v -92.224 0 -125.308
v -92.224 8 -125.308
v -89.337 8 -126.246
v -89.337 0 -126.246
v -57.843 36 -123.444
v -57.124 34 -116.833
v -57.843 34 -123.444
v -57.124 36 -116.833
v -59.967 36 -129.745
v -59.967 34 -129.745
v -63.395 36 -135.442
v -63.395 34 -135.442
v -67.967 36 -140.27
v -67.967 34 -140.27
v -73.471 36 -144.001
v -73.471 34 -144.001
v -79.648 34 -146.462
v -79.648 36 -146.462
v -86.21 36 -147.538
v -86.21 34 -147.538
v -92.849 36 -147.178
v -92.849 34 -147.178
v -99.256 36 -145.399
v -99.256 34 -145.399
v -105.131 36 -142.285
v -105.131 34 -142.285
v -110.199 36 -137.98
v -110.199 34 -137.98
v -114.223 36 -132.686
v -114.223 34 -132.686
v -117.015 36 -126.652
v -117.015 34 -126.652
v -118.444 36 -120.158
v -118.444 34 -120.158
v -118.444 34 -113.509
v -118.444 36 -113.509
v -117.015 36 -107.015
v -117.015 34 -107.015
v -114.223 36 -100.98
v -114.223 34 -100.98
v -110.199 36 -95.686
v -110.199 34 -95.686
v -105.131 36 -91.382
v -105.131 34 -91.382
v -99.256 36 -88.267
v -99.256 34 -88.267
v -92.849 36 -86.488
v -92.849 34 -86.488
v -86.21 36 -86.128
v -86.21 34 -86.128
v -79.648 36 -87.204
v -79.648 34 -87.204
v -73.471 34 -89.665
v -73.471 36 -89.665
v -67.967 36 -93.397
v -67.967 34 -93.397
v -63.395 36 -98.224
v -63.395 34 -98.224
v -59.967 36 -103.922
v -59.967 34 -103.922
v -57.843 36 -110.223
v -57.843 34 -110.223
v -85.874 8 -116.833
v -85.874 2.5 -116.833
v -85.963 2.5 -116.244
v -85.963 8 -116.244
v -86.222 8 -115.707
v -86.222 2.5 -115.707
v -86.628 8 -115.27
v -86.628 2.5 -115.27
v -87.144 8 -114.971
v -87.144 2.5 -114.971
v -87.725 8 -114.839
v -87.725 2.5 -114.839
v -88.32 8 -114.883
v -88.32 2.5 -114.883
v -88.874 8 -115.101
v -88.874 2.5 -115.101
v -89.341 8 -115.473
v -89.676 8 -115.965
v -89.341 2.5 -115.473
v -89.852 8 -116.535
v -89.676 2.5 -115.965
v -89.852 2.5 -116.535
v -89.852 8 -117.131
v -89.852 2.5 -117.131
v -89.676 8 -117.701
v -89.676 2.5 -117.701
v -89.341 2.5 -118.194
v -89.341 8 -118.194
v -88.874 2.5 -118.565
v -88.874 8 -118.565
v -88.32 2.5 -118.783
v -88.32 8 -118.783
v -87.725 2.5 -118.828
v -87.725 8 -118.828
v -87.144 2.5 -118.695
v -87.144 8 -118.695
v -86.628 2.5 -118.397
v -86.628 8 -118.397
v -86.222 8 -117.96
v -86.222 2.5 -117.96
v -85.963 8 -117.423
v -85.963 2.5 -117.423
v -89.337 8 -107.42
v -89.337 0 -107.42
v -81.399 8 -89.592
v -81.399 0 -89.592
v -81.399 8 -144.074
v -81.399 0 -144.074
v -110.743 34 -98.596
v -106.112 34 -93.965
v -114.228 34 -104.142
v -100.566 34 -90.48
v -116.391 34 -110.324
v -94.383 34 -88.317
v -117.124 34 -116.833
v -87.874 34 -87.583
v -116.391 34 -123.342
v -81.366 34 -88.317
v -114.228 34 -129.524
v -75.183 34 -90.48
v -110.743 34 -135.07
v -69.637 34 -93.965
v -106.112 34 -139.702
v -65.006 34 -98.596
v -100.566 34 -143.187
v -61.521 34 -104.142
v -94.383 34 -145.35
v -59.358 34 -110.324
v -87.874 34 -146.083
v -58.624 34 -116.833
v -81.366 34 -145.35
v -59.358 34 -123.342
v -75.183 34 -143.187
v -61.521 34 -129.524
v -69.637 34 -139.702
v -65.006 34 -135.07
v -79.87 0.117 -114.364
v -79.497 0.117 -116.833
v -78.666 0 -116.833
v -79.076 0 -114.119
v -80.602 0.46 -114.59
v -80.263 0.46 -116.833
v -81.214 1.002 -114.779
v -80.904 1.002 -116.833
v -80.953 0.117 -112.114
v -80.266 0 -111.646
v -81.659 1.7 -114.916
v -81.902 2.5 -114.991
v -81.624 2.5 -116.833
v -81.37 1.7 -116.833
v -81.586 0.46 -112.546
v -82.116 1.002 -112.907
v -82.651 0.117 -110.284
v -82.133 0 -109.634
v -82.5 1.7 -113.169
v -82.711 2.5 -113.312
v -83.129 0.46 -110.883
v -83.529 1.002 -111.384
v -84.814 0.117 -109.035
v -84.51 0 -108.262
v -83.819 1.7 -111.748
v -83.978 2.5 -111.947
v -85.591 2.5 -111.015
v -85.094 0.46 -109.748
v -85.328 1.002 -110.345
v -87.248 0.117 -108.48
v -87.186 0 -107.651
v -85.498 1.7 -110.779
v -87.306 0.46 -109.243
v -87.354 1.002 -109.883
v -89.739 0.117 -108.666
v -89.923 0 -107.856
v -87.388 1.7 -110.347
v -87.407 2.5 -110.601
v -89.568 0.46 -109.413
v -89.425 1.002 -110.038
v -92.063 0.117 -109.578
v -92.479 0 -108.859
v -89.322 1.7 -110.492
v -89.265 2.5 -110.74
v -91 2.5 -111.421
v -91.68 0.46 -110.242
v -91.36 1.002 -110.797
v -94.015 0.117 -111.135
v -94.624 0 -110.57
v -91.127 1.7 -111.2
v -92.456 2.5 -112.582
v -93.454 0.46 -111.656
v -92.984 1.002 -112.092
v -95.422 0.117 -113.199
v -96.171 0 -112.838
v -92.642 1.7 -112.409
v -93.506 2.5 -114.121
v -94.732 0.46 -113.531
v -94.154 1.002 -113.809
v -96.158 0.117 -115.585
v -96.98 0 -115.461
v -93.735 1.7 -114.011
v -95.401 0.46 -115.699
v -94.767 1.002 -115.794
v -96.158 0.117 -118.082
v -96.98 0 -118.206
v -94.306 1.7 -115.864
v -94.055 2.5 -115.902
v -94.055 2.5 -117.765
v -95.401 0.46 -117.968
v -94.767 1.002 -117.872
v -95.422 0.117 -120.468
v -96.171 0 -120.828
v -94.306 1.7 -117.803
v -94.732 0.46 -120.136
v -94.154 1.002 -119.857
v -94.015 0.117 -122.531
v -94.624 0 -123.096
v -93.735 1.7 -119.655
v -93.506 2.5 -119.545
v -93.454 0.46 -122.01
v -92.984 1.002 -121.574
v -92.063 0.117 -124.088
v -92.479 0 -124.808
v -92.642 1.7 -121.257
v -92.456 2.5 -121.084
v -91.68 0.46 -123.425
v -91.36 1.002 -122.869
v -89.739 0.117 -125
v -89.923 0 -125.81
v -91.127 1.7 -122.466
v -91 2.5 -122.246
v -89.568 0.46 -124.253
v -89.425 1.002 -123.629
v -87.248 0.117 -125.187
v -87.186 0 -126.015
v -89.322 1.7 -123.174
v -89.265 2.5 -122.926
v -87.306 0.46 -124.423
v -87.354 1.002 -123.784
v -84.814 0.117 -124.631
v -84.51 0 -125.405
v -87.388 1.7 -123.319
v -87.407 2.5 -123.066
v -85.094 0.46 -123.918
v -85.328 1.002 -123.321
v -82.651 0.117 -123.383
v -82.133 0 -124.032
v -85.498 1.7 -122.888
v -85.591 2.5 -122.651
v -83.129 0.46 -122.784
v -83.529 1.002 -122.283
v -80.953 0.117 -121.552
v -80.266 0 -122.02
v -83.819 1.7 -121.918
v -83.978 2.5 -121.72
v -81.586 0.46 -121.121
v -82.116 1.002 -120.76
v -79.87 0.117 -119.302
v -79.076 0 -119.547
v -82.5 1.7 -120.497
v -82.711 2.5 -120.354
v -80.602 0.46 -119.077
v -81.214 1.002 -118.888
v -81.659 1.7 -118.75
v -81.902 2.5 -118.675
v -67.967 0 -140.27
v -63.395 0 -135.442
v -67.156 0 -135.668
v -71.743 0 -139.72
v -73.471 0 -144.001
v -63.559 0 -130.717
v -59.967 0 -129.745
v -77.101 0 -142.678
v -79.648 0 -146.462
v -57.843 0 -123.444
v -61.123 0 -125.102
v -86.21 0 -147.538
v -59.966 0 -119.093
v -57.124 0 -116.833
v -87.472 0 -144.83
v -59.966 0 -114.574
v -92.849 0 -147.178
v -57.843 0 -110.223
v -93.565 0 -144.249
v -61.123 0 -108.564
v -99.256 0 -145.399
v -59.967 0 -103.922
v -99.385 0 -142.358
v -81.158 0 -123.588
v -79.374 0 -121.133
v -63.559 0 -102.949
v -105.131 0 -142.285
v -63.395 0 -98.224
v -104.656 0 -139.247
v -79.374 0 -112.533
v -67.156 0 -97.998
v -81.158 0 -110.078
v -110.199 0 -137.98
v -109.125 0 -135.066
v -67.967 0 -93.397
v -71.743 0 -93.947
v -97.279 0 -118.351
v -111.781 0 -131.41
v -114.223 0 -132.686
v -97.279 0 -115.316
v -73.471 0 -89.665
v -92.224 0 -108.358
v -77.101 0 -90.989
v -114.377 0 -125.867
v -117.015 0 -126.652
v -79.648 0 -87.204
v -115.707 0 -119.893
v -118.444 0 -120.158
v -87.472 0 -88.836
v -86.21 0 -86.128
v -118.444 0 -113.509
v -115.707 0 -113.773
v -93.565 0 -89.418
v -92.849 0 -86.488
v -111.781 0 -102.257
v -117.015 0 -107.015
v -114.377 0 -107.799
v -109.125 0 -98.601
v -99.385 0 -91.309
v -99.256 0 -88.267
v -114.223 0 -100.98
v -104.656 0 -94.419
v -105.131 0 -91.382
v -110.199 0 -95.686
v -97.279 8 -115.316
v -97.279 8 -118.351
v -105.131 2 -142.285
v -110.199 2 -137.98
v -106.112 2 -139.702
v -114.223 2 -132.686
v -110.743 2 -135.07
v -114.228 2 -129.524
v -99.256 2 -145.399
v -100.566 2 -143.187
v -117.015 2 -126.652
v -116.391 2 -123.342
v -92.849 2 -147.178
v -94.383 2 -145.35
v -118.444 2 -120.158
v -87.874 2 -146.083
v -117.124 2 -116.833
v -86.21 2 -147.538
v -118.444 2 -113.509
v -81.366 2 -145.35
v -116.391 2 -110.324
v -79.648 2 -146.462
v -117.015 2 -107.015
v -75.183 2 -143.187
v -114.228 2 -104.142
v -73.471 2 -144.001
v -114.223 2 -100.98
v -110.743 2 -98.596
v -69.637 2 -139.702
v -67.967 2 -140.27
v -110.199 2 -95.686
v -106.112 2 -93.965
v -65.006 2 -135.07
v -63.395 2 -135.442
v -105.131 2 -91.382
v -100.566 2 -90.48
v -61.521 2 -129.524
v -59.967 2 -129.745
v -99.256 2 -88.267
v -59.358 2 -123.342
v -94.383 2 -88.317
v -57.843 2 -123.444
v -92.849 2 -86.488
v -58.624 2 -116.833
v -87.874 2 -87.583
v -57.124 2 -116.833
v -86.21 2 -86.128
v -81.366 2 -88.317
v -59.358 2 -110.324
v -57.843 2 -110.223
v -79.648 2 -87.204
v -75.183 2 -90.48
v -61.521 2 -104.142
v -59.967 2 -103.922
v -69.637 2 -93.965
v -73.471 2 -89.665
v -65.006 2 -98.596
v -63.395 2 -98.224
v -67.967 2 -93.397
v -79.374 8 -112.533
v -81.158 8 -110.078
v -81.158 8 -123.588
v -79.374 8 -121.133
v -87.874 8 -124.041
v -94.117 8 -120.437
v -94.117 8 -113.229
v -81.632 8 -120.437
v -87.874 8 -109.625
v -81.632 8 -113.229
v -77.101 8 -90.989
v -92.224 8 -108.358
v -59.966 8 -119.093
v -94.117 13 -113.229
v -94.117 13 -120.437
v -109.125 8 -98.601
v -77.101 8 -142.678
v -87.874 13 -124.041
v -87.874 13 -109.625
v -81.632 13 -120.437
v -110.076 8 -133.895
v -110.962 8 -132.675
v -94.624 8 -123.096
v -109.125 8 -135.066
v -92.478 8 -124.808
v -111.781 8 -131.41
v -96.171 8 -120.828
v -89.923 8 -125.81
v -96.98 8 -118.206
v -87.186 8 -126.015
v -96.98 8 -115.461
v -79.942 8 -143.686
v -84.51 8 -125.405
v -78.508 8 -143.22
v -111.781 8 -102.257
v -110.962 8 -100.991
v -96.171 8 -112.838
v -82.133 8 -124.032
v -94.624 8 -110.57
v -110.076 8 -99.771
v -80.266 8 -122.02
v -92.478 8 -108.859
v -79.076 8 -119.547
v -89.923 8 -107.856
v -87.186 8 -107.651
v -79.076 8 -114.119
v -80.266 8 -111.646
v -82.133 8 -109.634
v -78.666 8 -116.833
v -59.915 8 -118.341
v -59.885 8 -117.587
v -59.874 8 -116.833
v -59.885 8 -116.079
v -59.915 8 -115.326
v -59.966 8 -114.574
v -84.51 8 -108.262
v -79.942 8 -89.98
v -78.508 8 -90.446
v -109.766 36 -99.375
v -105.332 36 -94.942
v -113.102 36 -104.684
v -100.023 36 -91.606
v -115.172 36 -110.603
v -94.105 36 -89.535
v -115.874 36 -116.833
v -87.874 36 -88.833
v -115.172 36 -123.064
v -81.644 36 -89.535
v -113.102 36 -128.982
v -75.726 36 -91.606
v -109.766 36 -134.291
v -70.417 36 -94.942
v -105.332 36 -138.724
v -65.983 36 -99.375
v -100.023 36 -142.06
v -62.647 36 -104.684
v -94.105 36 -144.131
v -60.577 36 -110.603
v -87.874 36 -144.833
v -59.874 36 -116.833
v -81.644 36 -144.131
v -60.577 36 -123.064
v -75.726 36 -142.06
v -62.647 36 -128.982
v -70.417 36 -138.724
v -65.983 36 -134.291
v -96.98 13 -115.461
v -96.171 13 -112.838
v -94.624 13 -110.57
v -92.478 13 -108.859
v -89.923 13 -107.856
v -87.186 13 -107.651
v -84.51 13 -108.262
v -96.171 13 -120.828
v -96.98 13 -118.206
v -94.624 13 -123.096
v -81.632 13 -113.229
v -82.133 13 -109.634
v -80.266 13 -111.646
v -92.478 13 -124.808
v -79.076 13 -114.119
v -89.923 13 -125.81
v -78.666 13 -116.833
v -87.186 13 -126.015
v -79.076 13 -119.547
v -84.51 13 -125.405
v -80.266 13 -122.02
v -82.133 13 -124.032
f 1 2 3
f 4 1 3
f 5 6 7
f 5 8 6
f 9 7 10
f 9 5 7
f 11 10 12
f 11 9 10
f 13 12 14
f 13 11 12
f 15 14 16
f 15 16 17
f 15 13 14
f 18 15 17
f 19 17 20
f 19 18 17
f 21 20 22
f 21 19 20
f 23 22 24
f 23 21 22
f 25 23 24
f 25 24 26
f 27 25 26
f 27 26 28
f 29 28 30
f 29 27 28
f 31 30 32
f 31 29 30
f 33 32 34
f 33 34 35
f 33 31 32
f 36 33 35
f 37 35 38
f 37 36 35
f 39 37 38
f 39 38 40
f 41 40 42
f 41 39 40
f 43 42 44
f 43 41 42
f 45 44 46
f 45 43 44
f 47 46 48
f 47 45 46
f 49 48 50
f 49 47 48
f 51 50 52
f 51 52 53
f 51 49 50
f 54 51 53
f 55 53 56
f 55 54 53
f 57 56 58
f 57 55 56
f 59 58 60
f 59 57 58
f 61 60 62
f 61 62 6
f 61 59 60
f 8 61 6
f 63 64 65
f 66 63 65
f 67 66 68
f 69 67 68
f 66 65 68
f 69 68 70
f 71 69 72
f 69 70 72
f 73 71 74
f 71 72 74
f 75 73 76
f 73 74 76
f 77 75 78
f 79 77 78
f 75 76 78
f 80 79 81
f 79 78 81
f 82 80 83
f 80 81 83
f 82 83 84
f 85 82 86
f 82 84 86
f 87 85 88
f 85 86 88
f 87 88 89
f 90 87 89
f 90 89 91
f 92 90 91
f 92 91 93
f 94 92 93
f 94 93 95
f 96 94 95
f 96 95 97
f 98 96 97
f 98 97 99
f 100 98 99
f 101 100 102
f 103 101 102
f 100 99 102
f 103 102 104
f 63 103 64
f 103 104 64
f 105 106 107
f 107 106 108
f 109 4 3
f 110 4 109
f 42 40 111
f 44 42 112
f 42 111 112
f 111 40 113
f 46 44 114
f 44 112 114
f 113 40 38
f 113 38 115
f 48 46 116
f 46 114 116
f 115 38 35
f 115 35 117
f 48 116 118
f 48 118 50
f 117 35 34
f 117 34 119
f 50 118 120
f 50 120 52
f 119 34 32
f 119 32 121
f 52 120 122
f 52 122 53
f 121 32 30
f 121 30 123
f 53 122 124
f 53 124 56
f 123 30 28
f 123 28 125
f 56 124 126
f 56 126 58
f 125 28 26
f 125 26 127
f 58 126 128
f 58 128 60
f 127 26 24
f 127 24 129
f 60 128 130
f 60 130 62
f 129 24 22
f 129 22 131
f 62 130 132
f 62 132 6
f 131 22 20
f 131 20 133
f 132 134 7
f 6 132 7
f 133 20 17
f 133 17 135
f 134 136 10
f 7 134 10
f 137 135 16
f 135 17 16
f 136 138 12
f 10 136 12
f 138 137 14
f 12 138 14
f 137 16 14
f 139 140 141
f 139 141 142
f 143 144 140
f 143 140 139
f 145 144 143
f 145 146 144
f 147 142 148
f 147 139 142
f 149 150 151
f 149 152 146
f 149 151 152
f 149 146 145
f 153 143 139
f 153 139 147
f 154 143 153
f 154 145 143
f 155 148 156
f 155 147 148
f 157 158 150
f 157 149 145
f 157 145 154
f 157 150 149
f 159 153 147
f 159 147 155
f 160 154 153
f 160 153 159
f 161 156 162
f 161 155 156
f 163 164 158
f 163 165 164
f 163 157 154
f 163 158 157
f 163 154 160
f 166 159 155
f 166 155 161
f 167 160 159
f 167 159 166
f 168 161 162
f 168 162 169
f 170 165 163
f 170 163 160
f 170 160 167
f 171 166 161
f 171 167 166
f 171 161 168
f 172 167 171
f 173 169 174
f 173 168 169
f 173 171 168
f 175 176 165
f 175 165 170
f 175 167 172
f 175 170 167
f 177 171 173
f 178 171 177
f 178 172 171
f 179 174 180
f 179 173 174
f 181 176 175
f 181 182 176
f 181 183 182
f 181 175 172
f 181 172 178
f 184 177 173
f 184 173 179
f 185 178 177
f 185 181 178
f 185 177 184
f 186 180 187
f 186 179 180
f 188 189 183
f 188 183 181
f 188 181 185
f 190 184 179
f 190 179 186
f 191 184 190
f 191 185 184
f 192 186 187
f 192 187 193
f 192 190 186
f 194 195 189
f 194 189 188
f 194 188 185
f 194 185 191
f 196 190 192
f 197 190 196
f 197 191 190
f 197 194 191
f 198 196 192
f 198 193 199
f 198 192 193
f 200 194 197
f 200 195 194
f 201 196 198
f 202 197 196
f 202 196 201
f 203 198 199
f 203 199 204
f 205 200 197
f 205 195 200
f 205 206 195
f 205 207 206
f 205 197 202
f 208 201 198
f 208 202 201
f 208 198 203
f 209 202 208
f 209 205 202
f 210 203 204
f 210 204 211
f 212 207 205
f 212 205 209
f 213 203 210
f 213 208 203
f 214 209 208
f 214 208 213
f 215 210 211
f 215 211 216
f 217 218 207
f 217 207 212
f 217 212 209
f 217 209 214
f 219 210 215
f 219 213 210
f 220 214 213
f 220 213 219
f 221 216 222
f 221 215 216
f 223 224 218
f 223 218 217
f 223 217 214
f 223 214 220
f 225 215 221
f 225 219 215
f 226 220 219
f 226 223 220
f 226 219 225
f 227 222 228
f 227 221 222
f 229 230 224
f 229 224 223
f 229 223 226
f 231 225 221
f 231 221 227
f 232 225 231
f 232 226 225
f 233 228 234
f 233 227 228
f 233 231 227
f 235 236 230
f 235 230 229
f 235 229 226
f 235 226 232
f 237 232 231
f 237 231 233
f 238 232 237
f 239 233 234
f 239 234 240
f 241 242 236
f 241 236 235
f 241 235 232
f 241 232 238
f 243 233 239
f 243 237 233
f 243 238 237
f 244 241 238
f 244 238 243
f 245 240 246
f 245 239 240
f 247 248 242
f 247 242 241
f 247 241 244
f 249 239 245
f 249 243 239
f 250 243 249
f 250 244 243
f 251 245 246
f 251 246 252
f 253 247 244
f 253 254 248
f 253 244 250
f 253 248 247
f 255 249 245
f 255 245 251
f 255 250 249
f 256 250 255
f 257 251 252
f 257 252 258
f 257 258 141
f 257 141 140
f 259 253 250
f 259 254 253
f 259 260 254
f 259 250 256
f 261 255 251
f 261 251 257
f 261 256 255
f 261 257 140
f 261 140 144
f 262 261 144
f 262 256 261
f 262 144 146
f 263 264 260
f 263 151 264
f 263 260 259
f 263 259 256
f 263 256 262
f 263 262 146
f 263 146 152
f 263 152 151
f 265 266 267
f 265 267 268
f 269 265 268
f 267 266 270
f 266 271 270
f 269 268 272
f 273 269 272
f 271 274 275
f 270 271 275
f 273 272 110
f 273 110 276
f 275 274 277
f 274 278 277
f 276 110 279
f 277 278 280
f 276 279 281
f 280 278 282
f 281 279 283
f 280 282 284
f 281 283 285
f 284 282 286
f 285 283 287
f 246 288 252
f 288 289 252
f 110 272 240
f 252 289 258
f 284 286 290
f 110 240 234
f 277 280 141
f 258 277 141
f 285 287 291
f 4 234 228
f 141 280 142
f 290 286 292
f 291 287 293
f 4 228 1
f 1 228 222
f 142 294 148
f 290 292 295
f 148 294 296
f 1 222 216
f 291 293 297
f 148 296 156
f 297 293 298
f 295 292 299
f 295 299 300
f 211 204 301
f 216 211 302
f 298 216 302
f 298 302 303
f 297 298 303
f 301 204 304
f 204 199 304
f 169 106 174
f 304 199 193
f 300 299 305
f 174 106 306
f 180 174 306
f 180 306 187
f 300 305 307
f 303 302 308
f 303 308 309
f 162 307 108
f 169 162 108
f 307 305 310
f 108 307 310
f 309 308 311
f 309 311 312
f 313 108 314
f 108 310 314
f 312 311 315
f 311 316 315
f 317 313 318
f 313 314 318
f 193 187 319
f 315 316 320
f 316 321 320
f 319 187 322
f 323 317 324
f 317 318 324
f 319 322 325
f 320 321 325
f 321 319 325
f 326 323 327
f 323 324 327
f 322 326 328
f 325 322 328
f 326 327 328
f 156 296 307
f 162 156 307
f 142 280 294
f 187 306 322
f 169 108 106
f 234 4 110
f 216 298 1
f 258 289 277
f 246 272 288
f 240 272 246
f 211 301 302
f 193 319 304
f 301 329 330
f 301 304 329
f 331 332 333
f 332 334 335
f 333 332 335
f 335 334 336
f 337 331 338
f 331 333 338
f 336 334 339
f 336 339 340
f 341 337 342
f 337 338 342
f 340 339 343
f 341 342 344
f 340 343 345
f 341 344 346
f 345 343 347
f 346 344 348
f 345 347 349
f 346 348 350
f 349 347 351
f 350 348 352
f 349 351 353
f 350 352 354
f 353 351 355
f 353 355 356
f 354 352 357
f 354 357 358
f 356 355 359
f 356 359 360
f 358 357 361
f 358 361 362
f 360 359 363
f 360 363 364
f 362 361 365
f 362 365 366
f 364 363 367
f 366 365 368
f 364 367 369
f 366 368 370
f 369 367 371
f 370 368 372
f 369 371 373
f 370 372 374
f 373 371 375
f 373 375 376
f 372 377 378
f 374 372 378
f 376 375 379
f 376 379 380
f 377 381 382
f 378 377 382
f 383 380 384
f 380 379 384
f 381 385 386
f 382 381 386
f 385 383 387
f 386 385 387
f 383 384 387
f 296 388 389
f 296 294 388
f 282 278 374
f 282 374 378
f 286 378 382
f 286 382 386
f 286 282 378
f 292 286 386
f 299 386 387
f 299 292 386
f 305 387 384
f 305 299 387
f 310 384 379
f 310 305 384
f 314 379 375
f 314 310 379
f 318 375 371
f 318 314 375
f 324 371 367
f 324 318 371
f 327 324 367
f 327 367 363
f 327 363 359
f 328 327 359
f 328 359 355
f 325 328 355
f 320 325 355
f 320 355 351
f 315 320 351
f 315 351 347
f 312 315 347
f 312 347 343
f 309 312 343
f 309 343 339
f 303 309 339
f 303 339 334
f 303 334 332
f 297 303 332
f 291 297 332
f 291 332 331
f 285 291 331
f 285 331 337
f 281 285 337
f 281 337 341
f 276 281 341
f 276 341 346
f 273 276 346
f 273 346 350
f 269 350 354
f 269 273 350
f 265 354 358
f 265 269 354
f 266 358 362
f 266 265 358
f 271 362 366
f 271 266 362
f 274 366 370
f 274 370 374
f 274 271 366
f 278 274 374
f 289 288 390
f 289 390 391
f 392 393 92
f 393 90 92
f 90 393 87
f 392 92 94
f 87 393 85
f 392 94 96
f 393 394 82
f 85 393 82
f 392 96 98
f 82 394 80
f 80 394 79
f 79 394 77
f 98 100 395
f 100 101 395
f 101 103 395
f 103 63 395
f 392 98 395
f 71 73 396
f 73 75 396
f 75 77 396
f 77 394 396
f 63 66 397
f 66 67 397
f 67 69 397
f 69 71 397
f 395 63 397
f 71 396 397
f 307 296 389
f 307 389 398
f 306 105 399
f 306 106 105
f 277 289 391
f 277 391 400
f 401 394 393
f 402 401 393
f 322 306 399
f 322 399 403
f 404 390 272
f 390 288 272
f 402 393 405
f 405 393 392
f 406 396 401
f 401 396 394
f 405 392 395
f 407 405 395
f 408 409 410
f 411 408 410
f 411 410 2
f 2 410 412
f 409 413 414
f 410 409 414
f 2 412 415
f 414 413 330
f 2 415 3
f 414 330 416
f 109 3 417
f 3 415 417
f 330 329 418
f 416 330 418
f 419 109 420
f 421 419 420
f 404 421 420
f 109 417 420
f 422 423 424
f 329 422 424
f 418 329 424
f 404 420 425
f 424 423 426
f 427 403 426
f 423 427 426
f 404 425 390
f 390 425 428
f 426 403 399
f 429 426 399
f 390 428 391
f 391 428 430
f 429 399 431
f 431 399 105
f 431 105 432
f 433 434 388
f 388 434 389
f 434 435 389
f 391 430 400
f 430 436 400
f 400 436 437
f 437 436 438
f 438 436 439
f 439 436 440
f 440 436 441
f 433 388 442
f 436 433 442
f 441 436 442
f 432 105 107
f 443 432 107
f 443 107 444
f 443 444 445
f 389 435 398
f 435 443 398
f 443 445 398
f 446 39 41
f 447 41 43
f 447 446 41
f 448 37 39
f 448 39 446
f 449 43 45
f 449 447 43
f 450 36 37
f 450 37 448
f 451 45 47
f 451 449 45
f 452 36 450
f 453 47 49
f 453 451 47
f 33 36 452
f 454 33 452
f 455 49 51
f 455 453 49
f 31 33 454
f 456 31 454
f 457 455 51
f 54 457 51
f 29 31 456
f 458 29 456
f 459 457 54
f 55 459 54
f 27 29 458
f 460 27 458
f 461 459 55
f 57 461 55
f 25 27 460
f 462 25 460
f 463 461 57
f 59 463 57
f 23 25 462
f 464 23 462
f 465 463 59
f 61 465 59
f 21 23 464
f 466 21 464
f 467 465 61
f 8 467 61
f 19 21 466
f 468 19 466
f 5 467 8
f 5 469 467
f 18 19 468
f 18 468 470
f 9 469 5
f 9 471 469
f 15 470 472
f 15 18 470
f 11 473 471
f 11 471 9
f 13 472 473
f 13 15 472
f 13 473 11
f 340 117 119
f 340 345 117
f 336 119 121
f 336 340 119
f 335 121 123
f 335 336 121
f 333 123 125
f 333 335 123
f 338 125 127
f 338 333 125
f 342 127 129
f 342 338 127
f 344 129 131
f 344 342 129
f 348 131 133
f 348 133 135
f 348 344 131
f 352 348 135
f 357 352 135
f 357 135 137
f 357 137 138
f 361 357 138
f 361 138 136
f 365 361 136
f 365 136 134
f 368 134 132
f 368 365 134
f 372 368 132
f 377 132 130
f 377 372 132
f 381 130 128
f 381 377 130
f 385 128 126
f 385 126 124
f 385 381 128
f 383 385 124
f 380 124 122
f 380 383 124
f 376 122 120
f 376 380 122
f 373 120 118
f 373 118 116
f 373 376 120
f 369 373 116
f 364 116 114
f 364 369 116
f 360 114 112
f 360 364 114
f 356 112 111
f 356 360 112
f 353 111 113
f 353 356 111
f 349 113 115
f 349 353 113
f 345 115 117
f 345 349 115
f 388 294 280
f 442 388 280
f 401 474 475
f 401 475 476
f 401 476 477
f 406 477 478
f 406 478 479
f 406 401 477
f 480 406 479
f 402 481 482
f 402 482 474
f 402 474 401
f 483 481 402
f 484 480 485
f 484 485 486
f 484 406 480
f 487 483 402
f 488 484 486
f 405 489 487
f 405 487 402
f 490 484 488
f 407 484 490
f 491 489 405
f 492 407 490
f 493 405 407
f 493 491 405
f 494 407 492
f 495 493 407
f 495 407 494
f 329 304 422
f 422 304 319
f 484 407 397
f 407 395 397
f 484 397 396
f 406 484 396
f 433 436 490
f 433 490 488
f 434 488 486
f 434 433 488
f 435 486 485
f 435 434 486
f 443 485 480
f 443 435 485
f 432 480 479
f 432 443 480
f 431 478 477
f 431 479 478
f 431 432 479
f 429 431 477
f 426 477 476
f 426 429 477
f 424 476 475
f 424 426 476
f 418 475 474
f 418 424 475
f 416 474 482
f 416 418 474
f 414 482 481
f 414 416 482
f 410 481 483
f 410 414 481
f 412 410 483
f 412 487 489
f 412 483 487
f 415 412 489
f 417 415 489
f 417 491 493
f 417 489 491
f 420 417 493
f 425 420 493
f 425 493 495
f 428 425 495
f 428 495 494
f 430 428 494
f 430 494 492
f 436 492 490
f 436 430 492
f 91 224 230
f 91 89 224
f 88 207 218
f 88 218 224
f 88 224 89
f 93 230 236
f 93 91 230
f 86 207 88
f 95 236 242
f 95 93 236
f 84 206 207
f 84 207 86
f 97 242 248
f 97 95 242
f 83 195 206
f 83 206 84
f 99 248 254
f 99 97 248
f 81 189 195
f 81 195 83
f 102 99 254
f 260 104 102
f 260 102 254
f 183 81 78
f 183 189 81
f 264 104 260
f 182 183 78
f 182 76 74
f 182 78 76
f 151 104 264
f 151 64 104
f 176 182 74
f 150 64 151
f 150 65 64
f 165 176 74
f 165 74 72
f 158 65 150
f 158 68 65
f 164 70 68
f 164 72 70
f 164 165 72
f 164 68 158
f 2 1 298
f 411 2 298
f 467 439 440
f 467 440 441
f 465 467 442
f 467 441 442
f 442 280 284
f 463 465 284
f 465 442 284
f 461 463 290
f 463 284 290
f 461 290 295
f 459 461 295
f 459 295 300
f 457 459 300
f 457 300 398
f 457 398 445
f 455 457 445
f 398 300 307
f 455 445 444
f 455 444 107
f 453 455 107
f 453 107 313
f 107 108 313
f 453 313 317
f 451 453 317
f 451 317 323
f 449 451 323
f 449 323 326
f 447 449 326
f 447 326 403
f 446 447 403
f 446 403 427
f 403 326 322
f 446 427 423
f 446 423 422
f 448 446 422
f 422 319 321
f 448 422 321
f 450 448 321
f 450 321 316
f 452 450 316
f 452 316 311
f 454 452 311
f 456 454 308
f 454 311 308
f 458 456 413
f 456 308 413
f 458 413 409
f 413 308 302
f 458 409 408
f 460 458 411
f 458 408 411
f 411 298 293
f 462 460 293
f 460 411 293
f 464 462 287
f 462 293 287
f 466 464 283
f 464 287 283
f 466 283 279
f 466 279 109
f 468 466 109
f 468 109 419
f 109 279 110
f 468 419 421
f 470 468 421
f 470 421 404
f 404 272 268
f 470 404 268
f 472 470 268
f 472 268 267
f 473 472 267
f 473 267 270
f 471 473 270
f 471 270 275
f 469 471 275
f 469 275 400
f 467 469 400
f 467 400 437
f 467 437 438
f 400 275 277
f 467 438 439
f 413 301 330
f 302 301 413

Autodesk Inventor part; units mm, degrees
ref_plane "YZ Plane" through (0, 0, 0) normal (1, 0, 0) x (0, 1, 0)
ref_plane "XZ Plane" through (0, 0, 0) normal (0, 1, 0) x (-1, 0, 0)
ref_plane "XY Plane" through (0, 0, 0) normal (0, 0, 1) x (1, 0, 0)
sketch "Sketch4" plane through (0, 0, 0) normal (0, 1, 0) x (-1, 0, 0)
  circle A0 centre (87.8745, -116.8332) radius 29.25
  point P0 (0, 0)
  dimension "d11" = 58.5
extrude "Extrusion4" add sketch "Sketch4" along normal blind 36
sketch "Sketch6" plane through (-87.8745, 0, -116.8332) normal (0, -1, 0) x (1, 0, 0)
  circle A0 centre (0, 0) radius 30.75
  point P0 (87.8745, 116.8332)
  dimension "d20" = 61.5
extrude "Extrusion6" add sketch "Sketch6" against normal blind 2
sketch "Sketch7" plane through (-87.8745, 36, -116.8332) normal (0, 1, 0) x (1, 0, 0)
  circle A0 centre (0, 0) radius 30.75
  point P0 (87.8745, -116.8332)
  dimension "d23" = 61.5
extrude "Extrusion7" add sketch "Sketch7" against normal blind 2
sketch "Sketch5" plane through (-87.8745, 0, -116.8332) normal (0, -1, 0) x (1, 0, 0)
  circle A0 centre (0, 0) radius 28
  circle A1 centre (0, 0) radius 29.25 projected
  point P0 (87.8745, 116.8332)
  dimension "d16" = 0
  dimension "d17" = 0
  dimension "d26" = 56
extrude "Extrusion5" cut sketch "Sketch5" against normal blind 36 contours A0
sketch "Sketch8" plane through (-87.8745, 0, -116.8332) normal (0, -1, 0) x (1, 0, 0)
  circle A0 centre (0, 0) radius 8.5
  circle A1 centre (0, 0) radius 28 projected
  line L0 (28, 0) -> (28, 2.25)
  line L1 (28, 0) -> (28, -2.25)
  line L2 (8.5, 0) -> (8.5, 4.3)
  line L3 (8.5, 0) -> (8.5, -4.3)
  line L4 (8.5, 4.3) -> (28, 2.25)
  line L5 (8.5, -4.3) -> (28, -2.25)
  arc A2 (27.9087, -2.2596) -> (27.9087, 2.2596) centre (0, 0) ccw
  line L6 (-1.4629, 9.4128) -> (6.5126, 27.3249)
  line L7 (2.6266, 8.084) -> (-1.4629, 9.4128)
  line L8 (2.6266, 8.084) -> (6.7162, 6.7552)
  line L9 (6.7162, 6.7552) -> (10.7924, 25.9343)
  arc A3 (10.7733, 25.8445) -> (6.4752, 27.241) centre (0, 0) ccw
  line L10 (-9.4041, 1.5174) -> (-23.975, 14.6377)
  line L11 (-6.8766, 4.9962) -> (-9.4041, 1.5174)
  line L12 (-6.8766, 4.9962) -> (-4.3492, 8.4749)
  line L13 (-4.3492, 8.4749) -> (-21.33, 18.2783)
  arc A4 (-21.2504, 18.2324) -> (-23.9068, 14.5763) centre (0, 0) ccw
  line L14 (-4.3492, -8.4749) -> (-21.33, -18.2783)
  line L15 (-6.8766, -4.9962) -> (-4.3492, -8.4749)
  line L16 (-6.8766, -4.9962) -> (-9.4041, -1.5174)
  line L17 (-9.4041, -1.5174) -> (-23.975, -14.6377)
  arc A5 (-23.9068, -14.5763) -> (-21.2504, -18.2324) centre (0, 0) ccw
  line L18 (6.7162, -6.7552) -> (10.7924, -25.9343)
  line L19 (2.6266, -8.084) -> (6.7162, -6.7552)
  line L20 (2.6266, -8.084) -> (-1.4629, -9.4128)
  line L21 (-1.4629, -9.4128) -> (6.5126, -27.3249)
  arc A6 (6.4752, -27.241) -> (10.7733, -25.8445) centre (0, 0) ccw
  line L22 (-1.4629, 9.4128) -> (-4.3492, 8.4749)
  line L23 (-9.4041, 1.5174) -> (-9.4041, -1.5174)
  line L24 (-4.3492, -8.4749) -> (-1.4629, -9.4128)
  line L25 (6.7162, -6.7552) -> (8.5, -4.3)
  line L26 (8.5, 4.3) -> (6.7162, 6.7552)
  line L27 (6.7162, 6.7552) -> (-1.4629, 9.4128)
  line L28 (-4.3492, 8.4749) -> (-9.4041, 1.5174)
  line L29 (-9.4041, -1.5174) -> (-4.3492, -8.4749)
  line L30 (-1.4629, -9.4128) -> (6.7162, -6.7552)
  line L31 (8.5, -4.3) -> (8.5, 4.3)
  point P0 (87.8745, 116.8332)
  point P1 (8.6525, 26.6296)
  point P2 (-22.6525, 16.458)
  point P3 (-22.6525, -16.458)
  point P4 (8.6525, -26.6296)
  dimension "d27" = 17
  dimension "d29" = 2.25
  dimension "d30" = 2.25
  dimension "d31" = 4.3
  dimension "d32" = 4.3
  dimension "d35" = 360
extrude "Extrusion8" add sketch "Sketch8" against normal blind 8 contours A0 | L3 L25 L19 A0 | A0 L8 L26 L2 | L2 L4 A1 L5 L3 | A0 L12 L22 L7 | L7 L6 A1 L9 L8 | L20 L24 L15 A0 | L19 L18 A1 L21 L20 | A0 L16 L23 L11 | L11 L10 A1 L13 L12 | L15 L14 A1 L17 L16
sketch "Sketch9" plane through (-87.8745, 0, -116.8332) normal (0, -1, 0) x (1, 0, 0)
  circle A0 centre (0, 0) radius 6.25
  point P0 (87.8745, 116.8332)
  dimension "d39" = 12.5
extrude "Extrusion9" cut sketch "Sketch9" against normal blind 2.5
fillet "Fillet1" radius 3 1 edges at (-94.1245, 0, -116.8332)
sketch "Sketch10" plane through (-87.8745, 2.5, -116.8332) normal (0, -1, 0) x (1, 0, 0)
  circle A0 centre (0, 0) radius 2
  point P0 (87.8745, 116.8332)
  dimension "d43" = 4
extrude "Extrusion10" cut sketch "Sketch10" against normal blind 50
sketch "Sketch11" plane through (-87.8745, 8, -116.8332) normal (0, 1, 0) x (1, 0, 0)
  circle A0 centre (0, 0) radius 9.208
  circle A1 centre (0, 0) radius 2 projected
  circle A2 centre (0, 0) radius 7.208
  circle A3 centre (0, 0) radius 9.208 projected
  line L0 (0, 7.208) -> (6.2423, 3.604)
  line L1 (6.2423, 3.604) -> (6.2423, -3.604)
  line L2 (6.2423, -3.604) -> (0, -7.208)
  line L3 (0, -7.208) -> (-6.2423, -3.604)
  line L4 (-6.2423, -3.604) -> (-6.2423, 3.604)
  line L5 (-6.2423, 3.604) -> (0, 7.208)
  point P0 (87.8745, -116.8332)
  dimension "d46" = 2
  dimension "d47" = 0
  dimension "d48" = 0
  dimension "d49" = 0
extrude "Extrusion11" add sketch "Sketch11" along normal blind 5 contours A0 | A2 L1 | L0 A2 | A2 L2 | L5 A2 | A2 L3 | L4 A2
equation "\"d30\" = d29"
equation "\"d32\" = d31"
properties part number "koleso" material "ABS Plastic"
